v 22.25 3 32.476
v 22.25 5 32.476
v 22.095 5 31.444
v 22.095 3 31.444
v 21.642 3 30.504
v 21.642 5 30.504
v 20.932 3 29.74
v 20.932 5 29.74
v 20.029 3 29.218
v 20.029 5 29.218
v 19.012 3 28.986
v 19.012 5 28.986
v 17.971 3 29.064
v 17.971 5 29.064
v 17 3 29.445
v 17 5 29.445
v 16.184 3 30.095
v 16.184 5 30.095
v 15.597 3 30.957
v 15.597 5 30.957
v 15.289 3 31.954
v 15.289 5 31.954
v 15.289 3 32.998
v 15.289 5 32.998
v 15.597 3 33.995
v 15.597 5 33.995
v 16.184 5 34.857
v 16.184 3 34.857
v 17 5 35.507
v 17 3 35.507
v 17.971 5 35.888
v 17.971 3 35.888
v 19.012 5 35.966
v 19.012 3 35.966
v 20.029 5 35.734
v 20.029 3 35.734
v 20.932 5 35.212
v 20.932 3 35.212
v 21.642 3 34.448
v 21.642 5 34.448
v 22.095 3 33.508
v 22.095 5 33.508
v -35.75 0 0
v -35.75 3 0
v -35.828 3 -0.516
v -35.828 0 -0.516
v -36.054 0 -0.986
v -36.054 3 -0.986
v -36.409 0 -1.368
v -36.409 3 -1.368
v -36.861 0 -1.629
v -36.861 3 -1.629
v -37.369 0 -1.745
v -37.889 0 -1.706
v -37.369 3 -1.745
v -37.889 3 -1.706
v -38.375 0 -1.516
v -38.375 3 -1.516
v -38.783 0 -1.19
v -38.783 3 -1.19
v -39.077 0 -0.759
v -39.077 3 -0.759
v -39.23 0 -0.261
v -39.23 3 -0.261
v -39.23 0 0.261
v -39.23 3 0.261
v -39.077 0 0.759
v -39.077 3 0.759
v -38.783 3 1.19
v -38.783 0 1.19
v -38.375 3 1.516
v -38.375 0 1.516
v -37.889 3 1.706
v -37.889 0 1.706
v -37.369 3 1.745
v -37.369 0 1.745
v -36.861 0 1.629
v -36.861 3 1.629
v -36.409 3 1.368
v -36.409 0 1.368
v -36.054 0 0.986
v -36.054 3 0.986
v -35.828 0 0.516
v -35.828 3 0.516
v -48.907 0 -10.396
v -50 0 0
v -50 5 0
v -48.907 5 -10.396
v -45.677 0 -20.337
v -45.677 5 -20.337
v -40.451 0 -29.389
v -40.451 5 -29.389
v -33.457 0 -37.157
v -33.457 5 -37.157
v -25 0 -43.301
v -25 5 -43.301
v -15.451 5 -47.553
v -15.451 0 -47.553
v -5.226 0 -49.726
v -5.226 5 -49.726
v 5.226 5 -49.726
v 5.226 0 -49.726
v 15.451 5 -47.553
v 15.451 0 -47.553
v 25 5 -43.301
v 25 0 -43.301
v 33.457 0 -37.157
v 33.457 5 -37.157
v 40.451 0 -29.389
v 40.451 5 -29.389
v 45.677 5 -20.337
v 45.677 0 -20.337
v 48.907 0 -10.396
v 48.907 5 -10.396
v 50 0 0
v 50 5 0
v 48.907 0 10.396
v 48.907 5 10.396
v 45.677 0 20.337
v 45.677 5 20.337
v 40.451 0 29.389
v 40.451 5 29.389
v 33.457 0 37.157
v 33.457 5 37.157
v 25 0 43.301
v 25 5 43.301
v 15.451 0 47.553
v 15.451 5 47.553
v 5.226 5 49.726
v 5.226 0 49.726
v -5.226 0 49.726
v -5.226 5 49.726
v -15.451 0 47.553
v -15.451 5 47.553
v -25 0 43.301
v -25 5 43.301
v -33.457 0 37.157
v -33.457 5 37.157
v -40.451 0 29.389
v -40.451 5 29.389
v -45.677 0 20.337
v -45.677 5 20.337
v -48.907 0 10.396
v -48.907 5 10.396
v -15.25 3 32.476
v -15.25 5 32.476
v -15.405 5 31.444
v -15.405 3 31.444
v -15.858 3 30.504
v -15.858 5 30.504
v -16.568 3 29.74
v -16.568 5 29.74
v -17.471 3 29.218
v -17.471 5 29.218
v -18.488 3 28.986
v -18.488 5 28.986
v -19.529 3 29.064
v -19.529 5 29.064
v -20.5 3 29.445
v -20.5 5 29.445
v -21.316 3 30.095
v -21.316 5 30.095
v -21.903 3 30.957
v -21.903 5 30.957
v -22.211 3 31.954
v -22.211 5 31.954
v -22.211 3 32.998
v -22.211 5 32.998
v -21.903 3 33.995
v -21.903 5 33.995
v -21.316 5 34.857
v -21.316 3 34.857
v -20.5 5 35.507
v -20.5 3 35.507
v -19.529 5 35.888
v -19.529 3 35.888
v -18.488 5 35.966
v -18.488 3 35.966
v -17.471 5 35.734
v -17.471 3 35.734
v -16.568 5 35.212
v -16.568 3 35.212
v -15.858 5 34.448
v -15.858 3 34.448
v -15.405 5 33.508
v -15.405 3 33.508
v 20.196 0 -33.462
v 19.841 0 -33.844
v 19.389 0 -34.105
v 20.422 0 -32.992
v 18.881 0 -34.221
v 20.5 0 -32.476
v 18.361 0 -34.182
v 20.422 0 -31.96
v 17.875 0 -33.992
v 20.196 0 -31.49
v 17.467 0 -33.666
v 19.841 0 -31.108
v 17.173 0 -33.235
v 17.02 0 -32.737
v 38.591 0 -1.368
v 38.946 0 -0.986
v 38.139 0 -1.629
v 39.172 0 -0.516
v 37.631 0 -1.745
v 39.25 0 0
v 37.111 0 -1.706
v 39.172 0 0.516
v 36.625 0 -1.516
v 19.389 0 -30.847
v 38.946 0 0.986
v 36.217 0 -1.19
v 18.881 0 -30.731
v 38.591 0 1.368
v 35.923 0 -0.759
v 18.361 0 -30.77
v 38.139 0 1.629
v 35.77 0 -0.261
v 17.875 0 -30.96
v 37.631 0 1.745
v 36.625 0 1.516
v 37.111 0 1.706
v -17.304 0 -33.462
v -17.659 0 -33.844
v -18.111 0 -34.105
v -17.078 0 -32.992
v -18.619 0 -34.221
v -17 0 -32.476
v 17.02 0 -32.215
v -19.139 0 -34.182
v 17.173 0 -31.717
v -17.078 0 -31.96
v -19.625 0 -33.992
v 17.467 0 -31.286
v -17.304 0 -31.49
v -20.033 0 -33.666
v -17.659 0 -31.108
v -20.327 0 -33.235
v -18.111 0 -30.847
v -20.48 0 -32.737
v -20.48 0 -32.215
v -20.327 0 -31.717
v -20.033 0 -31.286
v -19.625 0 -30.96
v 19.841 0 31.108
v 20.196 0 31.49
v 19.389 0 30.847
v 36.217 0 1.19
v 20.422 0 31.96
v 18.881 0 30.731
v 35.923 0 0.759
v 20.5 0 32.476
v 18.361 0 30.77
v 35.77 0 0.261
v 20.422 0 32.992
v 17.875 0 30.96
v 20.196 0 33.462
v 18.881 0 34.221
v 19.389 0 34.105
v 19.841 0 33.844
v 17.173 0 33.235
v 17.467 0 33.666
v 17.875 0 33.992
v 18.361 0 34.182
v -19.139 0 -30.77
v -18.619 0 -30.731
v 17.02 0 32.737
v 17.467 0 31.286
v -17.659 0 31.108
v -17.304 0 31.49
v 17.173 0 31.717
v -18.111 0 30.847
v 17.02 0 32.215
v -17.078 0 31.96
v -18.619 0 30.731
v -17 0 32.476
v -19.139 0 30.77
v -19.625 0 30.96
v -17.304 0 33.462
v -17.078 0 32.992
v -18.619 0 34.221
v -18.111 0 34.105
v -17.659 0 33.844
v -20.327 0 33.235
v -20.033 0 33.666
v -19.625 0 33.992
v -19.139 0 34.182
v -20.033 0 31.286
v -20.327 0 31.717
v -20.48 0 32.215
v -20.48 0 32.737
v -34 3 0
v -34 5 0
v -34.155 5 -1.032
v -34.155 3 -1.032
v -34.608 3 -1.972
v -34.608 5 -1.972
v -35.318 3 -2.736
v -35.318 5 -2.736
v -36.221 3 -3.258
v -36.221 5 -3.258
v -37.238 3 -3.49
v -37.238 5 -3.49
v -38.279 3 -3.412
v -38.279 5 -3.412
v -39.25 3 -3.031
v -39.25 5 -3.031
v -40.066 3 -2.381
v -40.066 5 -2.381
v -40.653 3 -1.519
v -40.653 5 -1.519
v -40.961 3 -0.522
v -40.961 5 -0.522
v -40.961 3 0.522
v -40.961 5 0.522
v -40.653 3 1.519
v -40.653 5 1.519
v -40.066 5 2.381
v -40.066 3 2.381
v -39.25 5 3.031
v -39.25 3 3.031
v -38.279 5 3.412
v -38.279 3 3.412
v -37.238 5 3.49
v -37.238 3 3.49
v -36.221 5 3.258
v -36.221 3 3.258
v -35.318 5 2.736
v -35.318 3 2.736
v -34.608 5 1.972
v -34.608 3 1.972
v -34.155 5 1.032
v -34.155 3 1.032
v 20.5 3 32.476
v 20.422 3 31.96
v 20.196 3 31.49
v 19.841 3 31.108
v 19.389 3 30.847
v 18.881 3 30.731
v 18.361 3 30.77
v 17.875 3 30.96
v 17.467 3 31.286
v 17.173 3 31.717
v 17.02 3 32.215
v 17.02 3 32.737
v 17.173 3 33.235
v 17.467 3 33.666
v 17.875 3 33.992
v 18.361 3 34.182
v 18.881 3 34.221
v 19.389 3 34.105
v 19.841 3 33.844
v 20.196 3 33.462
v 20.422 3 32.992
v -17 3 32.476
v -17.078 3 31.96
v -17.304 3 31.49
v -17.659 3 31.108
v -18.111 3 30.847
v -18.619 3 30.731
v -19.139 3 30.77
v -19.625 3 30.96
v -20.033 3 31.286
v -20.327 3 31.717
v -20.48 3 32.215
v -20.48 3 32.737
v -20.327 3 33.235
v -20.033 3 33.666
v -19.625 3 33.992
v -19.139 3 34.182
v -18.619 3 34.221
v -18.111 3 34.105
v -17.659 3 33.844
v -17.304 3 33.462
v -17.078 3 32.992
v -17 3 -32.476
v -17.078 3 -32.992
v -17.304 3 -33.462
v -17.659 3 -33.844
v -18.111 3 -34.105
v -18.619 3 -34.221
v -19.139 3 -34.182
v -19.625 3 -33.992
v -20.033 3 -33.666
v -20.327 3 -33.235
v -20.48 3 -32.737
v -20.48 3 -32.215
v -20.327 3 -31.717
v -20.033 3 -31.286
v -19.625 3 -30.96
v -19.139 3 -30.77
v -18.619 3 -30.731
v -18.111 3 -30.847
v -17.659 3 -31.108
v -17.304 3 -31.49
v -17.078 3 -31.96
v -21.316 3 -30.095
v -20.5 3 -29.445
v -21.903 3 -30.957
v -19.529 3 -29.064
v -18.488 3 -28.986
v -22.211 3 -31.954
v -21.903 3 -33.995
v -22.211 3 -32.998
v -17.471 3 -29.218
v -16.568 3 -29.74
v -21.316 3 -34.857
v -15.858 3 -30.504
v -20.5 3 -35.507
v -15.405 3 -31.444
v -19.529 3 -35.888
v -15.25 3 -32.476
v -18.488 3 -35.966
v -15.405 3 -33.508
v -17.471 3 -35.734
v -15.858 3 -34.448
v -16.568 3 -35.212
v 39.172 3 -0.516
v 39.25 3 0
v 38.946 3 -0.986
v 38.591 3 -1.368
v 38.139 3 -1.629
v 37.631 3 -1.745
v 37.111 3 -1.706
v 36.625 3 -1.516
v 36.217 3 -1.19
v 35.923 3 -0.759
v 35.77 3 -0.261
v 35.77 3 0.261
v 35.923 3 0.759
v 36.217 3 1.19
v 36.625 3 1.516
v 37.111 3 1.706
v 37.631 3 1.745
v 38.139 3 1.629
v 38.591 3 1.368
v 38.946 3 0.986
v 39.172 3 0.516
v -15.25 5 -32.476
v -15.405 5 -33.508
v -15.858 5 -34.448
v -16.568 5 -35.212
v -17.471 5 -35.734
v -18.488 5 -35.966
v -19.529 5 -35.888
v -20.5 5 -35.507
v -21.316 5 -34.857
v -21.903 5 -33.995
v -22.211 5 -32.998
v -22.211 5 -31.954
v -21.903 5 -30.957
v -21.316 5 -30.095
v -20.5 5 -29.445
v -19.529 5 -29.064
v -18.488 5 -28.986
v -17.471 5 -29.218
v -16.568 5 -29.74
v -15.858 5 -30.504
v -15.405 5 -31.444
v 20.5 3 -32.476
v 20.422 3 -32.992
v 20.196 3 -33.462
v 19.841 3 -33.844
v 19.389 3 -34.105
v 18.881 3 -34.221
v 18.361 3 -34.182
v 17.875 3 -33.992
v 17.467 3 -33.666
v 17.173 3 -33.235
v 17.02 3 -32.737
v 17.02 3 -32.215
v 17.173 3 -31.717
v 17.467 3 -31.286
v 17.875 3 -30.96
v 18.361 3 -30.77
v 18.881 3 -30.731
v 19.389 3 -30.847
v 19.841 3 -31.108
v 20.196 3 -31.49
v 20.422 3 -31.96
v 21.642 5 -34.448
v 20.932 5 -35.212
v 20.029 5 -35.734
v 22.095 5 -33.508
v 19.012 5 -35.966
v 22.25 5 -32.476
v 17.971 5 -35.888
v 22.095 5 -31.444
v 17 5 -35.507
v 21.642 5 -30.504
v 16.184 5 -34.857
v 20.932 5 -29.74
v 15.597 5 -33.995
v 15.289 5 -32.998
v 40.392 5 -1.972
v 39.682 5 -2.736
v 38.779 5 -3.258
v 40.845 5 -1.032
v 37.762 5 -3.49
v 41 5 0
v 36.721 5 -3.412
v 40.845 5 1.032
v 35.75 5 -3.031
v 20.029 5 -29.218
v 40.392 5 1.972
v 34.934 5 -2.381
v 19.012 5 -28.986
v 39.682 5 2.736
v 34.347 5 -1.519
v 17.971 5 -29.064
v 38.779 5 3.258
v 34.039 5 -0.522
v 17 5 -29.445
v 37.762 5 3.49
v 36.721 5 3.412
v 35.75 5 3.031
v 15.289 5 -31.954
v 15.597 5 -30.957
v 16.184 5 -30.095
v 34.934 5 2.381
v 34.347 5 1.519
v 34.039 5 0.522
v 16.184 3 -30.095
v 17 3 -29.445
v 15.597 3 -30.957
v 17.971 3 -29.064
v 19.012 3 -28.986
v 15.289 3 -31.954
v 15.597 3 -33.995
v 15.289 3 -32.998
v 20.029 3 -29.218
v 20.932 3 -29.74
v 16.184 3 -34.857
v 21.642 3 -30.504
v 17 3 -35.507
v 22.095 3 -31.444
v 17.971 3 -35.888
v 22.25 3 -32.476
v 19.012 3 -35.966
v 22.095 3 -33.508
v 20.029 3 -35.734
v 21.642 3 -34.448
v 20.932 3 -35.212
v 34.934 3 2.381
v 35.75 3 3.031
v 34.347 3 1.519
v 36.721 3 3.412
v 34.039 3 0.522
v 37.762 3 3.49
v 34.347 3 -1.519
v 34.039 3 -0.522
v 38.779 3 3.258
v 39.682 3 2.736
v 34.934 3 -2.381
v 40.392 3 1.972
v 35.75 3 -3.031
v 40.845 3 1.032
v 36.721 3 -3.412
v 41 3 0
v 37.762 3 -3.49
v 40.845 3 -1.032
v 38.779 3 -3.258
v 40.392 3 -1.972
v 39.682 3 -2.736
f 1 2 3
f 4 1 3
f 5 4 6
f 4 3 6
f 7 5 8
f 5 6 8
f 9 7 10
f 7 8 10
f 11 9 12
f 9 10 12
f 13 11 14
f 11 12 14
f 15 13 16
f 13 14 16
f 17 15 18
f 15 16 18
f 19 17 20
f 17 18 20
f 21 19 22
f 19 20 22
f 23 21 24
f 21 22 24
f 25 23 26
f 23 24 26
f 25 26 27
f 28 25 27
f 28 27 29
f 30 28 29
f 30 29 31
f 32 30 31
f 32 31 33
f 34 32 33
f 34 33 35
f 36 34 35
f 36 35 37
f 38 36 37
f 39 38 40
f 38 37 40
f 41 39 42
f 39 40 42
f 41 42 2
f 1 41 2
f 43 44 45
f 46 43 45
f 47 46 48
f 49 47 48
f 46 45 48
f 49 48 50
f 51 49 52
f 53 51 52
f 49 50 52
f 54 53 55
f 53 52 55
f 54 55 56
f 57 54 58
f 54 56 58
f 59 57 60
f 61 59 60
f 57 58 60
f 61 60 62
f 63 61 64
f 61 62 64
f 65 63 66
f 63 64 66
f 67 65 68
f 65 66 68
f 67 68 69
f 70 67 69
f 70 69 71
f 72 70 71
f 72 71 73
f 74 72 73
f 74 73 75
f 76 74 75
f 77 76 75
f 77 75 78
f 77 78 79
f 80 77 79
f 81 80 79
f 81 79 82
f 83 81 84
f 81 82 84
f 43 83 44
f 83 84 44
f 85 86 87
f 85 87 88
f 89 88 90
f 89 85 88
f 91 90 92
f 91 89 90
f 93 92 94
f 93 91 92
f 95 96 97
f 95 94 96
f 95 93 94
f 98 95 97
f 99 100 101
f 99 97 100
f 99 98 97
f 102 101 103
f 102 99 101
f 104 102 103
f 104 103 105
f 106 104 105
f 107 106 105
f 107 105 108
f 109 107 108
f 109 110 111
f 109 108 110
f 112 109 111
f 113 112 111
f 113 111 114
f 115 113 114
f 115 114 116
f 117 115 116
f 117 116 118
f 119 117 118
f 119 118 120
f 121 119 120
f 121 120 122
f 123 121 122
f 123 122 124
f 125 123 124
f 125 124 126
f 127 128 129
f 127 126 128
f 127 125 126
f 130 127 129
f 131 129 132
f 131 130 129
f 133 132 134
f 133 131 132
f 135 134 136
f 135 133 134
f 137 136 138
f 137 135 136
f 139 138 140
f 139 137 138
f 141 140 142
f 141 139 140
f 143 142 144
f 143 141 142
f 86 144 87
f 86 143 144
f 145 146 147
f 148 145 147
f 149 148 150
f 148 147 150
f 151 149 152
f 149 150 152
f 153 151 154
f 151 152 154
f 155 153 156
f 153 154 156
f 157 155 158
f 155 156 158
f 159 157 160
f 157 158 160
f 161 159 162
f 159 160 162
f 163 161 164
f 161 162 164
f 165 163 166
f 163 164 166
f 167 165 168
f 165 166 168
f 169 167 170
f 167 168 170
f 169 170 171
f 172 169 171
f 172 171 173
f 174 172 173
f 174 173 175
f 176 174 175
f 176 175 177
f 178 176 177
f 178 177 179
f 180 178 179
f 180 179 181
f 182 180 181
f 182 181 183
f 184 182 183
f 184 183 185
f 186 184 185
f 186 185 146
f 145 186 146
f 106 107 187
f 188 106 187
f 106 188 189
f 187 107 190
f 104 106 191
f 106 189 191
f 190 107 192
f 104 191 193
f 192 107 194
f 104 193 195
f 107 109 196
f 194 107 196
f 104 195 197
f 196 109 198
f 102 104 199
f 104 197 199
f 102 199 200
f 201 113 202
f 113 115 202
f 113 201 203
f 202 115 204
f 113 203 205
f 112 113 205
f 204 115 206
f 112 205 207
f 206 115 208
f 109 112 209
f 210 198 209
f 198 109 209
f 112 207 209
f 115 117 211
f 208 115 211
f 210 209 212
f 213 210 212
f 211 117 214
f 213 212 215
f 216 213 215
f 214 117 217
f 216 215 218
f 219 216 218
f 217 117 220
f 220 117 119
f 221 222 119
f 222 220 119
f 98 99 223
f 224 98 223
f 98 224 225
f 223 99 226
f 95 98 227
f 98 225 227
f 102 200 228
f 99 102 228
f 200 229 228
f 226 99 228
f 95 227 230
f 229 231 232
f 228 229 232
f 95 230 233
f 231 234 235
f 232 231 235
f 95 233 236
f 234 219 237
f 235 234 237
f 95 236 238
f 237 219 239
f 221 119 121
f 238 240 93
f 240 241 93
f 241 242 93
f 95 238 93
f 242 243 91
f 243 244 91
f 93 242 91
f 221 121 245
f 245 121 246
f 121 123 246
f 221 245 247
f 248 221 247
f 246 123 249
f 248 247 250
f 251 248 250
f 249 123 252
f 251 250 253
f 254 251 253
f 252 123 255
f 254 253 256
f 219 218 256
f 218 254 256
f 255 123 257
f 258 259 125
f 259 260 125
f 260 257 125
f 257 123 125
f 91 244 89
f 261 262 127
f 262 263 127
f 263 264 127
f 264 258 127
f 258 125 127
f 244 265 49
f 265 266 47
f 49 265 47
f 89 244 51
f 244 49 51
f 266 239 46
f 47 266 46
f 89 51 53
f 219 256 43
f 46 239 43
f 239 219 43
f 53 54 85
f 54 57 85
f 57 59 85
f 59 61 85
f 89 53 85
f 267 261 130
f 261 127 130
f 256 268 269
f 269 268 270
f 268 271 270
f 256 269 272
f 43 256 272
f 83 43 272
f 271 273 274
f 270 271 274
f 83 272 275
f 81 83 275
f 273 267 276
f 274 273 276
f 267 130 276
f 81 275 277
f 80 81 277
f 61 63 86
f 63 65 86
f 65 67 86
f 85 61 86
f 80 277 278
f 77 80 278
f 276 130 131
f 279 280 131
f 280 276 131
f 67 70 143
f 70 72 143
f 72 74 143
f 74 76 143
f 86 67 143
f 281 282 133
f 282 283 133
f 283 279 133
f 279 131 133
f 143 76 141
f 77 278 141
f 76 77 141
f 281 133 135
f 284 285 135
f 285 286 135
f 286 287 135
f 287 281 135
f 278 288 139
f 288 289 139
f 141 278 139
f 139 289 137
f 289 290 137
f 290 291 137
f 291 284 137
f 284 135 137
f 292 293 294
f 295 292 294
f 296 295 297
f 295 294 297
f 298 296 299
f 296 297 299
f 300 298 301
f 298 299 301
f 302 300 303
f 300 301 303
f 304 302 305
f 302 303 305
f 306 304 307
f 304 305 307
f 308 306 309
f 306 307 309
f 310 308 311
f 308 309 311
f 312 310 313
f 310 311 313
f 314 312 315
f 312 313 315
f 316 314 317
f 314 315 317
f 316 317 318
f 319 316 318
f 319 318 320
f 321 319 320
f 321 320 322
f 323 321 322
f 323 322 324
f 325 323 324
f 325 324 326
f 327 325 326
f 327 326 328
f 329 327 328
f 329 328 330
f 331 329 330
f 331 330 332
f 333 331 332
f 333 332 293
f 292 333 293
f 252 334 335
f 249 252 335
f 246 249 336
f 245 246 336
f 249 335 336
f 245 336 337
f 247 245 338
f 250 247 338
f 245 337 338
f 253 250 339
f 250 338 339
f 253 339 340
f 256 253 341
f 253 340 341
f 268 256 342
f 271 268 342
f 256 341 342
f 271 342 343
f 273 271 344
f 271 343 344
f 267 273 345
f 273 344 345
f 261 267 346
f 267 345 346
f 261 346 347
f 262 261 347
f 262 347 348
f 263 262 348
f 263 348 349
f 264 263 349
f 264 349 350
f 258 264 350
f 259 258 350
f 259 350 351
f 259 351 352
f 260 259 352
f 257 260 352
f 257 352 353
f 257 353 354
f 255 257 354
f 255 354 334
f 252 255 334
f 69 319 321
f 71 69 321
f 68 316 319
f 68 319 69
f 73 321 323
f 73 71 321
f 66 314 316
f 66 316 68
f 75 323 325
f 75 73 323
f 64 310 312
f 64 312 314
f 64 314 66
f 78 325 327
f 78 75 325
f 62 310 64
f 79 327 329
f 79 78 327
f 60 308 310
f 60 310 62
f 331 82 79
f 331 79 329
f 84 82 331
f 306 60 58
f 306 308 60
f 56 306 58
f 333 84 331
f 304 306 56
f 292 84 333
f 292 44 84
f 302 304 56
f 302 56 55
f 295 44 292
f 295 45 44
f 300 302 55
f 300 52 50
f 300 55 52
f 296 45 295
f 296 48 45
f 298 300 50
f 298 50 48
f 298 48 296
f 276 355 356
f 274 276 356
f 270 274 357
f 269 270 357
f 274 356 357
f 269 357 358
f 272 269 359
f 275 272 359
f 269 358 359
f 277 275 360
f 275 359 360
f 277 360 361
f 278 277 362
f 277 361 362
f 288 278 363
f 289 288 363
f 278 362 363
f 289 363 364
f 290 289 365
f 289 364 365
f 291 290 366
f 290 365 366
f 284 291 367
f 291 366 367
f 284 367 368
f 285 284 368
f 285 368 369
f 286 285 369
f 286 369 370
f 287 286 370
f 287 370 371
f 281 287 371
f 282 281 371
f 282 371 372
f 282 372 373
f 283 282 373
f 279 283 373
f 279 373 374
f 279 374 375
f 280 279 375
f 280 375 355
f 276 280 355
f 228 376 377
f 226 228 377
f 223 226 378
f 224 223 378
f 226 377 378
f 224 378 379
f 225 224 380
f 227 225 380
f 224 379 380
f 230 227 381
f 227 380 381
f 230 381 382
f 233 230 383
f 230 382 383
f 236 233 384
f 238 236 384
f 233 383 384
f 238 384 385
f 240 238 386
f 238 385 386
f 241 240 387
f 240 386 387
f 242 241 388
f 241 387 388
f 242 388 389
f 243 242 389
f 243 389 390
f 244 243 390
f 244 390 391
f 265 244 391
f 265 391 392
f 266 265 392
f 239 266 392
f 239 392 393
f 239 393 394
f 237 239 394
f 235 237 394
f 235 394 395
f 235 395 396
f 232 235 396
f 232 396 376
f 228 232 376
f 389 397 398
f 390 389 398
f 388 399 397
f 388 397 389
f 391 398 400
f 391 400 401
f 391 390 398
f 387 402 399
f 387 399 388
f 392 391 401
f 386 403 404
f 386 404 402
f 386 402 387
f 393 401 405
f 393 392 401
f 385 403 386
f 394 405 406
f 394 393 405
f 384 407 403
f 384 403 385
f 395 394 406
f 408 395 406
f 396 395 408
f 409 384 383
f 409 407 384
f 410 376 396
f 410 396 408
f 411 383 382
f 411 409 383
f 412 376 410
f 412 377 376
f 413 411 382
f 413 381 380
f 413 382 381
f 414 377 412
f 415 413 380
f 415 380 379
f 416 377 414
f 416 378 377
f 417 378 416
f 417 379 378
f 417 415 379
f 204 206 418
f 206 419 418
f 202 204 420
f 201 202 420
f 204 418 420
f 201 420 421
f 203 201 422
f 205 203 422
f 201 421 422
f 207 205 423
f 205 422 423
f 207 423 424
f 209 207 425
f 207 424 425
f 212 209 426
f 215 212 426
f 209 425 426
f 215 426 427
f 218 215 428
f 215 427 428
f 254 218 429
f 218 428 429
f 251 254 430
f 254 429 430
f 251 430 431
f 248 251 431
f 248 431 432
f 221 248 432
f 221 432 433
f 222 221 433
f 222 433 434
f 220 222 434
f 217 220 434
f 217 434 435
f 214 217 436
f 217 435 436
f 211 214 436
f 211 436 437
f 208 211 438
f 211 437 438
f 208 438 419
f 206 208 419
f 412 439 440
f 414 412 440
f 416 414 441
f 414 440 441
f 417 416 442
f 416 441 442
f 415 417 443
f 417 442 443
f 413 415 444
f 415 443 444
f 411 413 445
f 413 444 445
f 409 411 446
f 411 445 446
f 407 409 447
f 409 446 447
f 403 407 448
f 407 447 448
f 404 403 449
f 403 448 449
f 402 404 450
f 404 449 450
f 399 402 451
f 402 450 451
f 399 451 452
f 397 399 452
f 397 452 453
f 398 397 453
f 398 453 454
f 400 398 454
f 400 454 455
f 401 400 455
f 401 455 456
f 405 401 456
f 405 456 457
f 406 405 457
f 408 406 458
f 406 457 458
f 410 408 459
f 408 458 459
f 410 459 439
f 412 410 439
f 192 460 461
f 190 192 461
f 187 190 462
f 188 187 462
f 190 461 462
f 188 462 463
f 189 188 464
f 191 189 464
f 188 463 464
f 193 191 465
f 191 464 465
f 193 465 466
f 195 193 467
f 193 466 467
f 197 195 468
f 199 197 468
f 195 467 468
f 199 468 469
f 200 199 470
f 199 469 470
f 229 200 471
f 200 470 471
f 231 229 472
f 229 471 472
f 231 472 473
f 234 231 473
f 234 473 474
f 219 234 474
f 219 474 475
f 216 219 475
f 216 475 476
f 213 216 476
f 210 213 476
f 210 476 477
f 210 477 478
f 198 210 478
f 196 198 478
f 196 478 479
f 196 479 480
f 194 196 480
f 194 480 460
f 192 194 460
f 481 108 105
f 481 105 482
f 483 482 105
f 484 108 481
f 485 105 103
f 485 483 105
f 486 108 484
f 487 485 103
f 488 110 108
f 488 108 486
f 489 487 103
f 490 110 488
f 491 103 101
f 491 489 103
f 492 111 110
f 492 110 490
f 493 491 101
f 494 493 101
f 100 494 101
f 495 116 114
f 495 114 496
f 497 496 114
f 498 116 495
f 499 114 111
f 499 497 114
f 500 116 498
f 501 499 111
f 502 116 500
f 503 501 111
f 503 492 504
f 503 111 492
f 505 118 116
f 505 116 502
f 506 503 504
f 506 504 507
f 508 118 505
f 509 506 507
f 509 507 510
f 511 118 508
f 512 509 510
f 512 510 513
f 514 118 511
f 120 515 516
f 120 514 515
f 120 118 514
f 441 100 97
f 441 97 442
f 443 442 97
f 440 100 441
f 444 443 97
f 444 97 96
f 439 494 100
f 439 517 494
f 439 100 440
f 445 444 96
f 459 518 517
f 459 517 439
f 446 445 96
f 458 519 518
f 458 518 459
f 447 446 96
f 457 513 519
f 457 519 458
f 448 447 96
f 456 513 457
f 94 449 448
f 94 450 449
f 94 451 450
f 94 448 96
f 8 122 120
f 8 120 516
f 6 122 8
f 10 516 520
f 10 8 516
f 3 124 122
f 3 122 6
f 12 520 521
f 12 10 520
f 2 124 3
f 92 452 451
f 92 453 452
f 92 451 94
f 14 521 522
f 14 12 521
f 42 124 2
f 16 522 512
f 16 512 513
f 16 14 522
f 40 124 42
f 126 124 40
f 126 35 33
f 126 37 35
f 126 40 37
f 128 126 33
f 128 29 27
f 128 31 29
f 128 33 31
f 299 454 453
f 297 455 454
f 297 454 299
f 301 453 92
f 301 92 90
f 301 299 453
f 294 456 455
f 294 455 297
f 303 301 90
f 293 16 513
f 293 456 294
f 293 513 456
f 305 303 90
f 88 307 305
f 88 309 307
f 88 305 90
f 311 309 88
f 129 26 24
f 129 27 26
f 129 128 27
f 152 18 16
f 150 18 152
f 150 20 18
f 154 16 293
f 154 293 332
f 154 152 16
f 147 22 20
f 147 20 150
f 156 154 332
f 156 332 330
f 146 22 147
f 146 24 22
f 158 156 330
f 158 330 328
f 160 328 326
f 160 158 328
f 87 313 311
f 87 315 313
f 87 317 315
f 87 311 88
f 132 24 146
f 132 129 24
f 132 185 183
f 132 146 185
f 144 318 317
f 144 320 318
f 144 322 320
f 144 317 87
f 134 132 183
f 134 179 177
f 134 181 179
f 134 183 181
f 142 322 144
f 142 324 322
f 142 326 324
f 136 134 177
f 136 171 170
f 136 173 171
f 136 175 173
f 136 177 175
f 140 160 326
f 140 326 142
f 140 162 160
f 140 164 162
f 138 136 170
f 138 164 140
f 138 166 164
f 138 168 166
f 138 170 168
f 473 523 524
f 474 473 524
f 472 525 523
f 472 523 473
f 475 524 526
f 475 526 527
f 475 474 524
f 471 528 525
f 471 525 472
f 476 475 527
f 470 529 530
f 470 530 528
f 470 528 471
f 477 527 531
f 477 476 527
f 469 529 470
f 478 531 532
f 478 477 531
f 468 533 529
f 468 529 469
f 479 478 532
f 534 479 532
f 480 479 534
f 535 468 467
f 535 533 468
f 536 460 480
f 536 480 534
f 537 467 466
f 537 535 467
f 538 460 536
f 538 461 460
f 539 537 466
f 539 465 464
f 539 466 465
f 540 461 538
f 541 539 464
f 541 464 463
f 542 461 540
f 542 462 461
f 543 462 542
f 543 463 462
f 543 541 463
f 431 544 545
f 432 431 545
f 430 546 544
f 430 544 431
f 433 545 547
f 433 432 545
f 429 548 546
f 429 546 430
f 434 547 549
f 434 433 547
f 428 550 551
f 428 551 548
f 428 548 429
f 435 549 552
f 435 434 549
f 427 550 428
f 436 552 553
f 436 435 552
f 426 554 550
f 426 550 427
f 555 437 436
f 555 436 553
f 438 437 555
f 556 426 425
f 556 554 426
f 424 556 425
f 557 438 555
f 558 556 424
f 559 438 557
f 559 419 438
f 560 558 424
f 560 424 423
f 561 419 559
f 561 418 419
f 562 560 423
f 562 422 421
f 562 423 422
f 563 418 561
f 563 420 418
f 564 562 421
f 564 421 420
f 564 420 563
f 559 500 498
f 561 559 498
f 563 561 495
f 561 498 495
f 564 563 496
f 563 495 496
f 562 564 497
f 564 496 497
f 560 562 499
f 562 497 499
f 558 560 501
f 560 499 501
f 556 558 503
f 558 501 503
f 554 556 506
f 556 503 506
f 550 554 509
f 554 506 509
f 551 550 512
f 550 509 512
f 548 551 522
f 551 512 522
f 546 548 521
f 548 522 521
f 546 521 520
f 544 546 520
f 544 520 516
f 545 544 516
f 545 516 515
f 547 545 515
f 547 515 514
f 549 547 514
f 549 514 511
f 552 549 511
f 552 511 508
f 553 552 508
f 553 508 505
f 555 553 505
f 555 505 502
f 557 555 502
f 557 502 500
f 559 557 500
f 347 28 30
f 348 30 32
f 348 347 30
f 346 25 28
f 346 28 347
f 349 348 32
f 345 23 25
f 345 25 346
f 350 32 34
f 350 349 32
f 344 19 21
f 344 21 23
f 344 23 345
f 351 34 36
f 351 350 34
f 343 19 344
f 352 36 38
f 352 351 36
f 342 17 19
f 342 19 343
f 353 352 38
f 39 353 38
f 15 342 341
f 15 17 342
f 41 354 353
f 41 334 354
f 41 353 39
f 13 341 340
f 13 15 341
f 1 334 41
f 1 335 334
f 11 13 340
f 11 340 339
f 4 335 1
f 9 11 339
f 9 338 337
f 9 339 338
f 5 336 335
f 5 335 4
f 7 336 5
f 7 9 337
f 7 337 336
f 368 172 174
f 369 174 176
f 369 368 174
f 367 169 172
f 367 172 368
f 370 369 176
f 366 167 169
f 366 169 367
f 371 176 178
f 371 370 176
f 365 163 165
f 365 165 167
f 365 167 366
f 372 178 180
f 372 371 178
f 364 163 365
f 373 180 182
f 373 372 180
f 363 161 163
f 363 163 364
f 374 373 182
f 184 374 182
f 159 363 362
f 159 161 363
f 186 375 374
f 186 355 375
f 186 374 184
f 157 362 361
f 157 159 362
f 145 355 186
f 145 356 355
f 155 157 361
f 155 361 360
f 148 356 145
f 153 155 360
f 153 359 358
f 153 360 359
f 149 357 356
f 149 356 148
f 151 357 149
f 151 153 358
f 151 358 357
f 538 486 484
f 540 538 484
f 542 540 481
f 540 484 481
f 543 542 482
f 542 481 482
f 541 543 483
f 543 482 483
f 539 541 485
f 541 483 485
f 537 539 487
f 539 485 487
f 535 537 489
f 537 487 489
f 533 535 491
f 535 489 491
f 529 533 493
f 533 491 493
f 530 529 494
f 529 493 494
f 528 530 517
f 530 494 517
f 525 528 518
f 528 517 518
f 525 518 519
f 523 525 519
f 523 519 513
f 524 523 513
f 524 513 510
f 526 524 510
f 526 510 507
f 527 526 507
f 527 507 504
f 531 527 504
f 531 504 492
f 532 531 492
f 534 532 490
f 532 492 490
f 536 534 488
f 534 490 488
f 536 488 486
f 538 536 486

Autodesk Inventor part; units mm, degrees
ref_plane "YZ Plane" through (0, 0, 0) normal (1, 0, 0) x (0, 1, 0)
ref_plane "XZ Plane" through (0, 0, 0) normal (0, 1, 0) x (-1, 0, 0)
ref_plane "XY Plane" through (0, 0, 0) normal (0, 0, 1) x (1, 0, 0)
sketch "Boceto1" plane through (0, 0, 0) normal (0, 1, 0) x (-1, 0, 0)
  circle A0 centre (0, 0) radius 50
  dimension "d0" = 100
extrude "Extrusión1" add sketch "Boceto1" along normal blind 5
sketch "Boceto2" plane through (0, 5, 0) normal (0, 1, 0) x (1, 0, 0)
  circle A0 centre (0, 0) radius 37.5 construction
  line L0 (-37.5, 0) -> (-18.75, 32.476) construction
  line L1 (-18.75, 32.476) -> (18.75, 32.476) construction
  line L2 (18.75, 32.476) -> (37.5, 0) construction
  line L3 (37.5, 0) -> (18.75, -32.476) construction
  line L4 (18.75, -32.476) -> (-18.75, -32.476) construction
  line L5 (-18.75, -32.476) -> (-37.5, 0) construction
  circle A1 centre (-18.75, -32.476) radius 3.5
  circle A2 centre (-37.5, 0) radius 3.5
  circle A3 centre (-18.75, 32.476) radius 3.5
  circle A4 centre (18.75, 32.476) radius 3.5
  circle A5 centre (37.5, 0) radius 3.5
  circle A6 centre (18.75, -32.476) radius 3.5
  dimension "d3" = 75
  dimension "d4" = 7
  dimension "d5" = 7
  dimension "d6" = 7
  dimension "d7" = 7
  dimension "d8" = 7
  dimension "d9" = 7
extrude "Extrusión2" cut sketch "Boceto2" against normal blind 2
sketch "Boceto3" plane through (0, 5, 0) normal (0, 1, 0) x (1, 0, 0)
  circle A0 centre (0, 0) radius 37.5 construction
  circle A1 centre (37.5, 0) radius 3.5 projected
  line L0 (37.5, 0) -> (18.75, -32.476) construction
  line L1 (18.75, -32.476) -> (-18.75, -32.476) construction
  line L2 (-18.75, -32.476) -> (-37.5, 0) construction
  line L3 (-37.5, 0) -> (-18.75, 32.476) construction
  line L4 (-18.75, 32.476) -> (18.75, 32.476) construction
  line L5 (18.75, 32.476) -> (37.5, 0) construction
  circle A2 centre (-37.5, 0) radius 1.75
  circle A3 centre (-18.75, -32.476) radius 1.75
  circle A4 centre (18.75, -32.476) radius 1.75
  circle A5 centre (37.5, 0) radius 1.75
  circle A6 centre (18.75, 32.476) radius 1.75
  circle A7 centre (-18.75, 32.476) radius 1.75
  dimension "d12" = 75
  dimension "d13" = 3.5
  dimension "d14" = 3.5
  dimension "d15" = 3.5
  dimension "d16" = 3.5
  dimension "d17" = 3.5
  dimension "d18" = 3.5
extrude "Extrusión3" cut sketch "Boceto3" along normal mid plane 10 contours A2 | A3 | A4 | A5 | A6 | A7
